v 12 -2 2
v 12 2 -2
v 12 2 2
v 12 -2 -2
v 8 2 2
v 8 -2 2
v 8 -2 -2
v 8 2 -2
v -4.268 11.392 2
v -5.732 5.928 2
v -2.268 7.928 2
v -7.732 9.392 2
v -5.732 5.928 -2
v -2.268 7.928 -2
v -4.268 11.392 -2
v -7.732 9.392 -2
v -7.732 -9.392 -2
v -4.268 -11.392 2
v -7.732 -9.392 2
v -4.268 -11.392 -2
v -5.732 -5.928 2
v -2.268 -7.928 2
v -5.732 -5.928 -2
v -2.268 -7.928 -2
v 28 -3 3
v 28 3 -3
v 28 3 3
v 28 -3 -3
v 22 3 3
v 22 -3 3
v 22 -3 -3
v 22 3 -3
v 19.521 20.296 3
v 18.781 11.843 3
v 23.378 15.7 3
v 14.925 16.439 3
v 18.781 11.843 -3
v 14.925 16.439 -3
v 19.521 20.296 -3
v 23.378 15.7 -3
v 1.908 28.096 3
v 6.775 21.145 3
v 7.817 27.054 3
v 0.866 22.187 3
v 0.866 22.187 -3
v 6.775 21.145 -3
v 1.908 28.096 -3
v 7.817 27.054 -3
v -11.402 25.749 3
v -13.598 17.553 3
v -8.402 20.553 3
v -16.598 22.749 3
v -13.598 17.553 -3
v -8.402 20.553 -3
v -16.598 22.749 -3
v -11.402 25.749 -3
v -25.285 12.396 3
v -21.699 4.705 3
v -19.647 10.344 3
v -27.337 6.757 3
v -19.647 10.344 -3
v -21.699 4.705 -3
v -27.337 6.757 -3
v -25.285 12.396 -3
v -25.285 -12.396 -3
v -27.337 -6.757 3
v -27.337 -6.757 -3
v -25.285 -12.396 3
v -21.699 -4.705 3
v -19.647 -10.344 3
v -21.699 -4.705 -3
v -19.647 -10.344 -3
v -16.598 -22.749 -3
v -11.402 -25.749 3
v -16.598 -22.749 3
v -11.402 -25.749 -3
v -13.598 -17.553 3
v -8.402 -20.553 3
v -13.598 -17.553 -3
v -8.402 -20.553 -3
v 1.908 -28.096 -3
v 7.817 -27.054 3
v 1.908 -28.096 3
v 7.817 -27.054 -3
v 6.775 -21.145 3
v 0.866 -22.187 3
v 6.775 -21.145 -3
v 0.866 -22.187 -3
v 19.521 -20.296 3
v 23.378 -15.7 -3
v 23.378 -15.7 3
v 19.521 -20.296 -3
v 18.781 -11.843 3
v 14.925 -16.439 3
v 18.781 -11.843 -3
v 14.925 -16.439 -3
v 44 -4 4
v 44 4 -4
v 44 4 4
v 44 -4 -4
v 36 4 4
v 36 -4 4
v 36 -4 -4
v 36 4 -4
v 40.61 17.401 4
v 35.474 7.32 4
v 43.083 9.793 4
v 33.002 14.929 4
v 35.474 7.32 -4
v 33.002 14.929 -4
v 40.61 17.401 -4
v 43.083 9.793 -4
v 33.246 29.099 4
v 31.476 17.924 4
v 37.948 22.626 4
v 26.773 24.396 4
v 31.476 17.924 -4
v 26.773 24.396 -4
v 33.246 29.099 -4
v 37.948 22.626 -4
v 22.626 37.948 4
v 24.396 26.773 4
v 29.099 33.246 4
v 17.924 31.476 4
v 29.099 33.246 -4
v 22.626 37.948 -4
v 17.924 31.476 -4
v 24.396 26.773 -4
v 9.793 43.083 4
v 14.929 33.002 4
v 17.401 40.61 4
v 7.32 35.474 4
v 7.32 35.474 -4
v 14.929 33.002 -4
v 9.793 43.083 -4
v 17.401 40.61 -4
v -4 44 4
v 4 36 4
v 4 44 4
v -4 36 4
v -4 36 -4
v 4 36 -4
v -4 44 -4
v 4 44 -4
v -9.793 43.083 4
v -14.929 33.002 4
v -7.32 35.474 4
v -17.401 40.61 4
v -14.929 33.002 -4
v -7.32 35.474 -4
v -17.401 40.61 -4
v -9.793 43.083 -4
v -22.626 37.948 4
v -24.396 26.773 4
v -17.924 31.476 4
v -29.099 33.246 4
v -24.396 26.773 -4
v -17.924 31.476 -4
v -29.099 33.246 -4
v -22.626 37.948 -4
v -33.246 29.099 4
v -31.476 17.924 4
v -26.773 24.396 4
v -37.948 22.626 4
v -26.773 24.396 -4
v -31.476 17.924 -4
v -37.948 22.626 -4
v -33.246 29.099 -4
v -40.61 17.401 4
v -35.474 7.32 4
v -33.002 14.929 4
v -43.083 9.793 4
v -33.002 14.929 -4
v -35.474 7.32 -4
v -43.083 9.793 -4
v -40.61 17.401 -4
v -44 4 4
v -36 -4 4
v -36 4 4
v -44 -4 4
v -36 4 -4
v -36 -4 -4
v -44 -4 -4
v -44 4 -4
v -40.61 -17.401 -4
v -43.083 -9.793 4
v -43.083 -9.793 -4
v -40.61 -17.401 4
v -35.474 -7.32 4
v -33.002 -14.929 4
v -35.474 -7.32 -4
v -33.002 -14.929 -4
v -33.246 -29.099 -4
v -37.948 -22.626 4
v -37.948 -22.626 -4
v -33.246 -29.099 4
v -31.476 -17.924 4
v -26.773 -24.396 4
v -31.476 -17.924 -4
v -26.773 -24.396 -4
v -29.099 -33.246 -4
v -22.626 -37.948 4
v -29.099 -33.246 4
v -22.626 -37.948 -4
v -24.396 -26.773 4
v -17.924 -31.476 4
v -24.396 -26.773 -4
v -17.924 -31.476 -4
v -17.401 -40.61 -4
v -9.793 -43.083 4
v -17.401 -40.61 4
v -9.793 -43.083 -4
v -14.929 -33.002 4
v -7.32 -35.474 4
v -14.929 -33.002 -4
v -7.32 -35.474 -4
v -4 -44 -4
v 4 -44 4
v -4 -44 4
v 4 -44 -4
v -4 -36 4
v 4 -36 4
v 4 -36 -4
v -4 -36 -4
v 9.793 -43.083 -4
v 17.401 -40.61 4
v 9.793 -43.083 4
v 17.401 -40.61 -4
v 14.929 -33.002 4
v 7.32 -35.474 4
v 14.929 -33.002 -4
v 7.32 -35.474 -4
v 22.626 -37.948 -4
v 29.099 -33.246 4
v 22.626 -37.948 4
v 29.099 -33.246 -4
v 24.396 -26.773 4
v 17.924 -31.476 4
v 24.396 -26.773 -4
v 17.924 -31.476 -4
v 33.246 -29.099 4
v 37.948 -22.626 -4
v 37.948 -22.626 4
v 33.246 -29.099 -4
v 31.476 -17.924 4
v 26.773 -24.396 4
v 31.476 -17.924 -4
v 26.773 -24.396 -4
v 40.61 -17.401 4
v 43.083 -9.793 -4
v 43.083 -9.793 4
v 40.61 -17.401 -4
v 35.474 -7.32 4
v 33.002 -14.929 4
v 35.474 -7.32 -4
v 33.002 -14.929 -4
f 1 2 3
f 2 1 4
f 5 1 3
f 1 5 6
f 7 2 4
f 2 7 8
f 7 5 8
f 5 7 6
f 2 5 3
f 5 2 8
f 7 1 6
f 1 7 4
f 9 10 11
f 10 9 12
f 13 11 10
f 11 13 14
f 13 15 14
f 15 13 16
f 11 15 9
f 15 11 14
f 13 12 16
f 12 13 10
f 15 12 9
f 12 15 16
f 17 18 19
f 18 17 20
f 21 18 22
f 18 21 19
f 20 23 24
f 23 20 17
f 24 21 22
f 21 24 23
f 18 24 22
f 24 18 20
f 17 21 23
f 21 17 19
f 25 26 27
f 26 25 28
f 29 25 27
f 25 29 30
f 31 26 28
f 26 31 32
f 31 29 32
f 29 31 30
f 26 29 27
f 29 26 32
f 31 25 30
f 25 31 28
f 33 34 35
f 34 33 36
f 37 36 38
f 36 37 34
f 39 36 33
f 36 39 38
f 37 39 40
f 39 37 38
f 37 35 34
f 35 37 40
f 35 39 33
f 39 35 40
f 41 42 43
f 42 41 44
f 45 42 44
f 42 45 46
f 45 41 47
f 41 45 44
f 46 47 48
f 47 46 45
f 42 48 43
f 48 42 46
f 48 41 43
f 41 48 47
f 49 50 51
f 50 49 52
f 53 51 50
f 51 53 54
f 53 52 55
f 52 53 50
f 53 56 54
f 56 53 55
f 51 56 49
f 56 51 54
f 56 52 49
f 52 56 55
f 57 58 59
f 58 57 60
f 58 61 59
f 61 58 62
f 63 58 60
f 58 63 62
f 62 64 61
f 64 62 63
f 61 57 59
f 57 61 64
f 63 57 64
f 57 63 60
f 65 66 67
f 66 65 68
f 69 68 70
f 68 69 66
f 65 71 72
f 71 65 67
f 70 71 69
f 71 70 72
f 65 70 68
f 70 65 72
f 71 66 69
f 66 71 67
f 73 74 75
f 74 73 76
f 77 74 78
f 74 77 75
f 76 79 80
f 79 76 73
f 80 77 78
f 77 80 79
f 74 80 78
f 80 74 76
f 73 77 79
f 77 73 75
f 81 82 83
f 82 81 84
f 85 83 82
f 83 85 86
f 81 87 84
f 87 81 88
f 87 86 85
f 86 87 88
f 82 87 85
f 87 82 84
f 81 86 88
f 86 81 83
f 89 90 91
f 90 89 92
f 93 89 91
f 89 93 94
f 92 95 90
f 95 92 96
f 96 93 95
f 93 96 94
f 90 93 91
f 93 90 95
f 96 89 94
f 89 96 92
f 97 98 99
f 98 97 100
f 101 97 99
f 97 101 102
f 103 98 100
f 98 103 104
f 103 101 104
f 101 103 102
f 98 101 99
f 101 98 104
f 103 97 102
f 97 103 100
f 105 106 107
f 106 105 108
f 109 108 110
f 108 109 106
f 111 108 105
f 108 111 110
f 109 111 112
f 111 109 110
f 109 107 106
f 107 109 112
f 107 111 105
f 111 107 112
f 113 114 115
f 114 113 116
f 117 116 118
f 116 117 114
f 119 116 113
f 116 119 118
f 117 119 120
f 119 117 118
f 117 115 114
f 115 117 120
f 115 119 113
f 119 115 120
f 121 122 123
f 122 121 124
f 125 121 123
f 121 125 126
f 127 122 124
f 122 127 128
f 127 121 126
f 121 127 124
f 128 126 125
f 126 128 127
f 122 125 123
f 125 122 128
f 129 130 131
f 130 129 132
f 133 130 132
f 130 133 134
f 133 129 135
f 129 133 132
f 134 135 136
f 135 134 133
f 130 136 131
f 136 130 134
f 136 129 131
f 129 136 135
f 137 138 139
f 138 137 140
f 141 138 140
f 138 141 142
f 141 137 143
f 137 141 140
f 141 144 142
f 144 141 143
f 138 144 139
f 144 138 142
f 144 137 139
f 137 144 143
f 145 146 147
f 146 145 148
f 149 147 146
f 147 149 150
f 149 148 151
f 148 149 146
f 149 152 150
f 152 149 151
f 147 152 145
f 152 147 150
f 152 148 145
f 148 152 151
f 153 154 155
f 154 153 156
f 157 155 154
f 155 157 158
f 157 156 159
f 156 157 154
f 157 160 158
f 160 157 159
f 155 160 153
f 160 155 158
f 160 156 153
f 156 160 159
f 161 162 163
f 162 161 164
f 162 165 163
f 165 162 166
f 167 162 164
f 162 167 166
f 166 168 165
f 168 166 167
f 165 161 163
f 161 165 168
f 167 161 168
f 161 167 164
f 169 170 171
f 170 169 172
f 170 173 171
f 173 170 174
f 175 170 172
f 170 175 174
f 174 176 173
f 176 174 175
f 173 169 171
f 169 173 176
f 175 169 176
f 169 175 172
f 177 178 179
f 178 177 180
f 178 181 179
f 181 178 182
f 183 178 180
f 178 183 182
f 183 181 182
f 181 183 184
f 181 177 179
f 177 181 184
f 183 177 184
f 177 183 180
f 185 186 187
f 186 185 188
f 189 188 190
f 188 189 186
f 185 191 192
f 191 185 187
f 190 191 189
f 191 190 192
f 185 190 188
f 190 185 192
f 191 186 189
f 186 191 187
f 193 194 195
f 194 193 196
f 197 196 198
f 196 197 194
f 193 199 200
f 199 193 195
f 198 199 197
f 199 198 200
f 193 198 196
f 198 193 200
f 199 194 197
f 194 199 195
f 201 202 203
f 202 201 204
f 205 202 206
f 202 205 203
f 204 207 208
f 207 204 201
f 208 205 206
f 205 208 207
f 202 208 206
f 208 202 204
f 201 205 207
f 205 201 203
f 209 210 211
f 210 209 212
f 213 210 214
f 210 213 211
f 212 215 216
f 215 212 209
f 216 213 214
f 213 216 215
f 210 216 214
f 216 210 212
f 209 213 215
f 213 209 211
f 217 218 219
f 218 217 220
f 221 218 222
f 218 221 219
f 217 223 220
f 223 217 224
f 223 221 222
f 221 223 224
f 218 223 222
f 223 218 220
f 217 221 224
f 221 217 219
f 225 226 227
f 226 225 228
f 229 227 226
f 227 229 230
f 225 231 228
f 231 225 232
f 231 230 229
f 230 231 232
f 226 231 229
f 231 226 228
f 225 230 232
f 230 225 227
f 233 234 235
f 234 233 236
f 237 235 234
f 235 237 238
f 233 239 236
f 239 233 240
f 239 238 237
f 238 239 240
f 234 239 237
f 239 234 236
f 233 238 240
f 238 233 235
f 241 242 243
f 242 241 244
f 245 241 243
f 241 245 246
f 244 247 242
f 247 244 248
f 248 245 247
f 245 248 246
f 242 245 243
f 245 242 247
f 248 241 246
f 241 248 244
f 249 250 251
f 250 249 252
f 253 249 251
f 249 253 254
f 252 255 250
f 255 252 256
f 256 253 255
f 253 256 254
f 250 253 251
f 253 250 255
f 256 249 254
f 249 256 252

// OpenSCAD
echo(version=version());

function size(x) = assert(x % 2 == 0, "Size must be an even number") x;

module ring(r = 10, cnt = 3, s = 6) {
    assert(r >= 10, "Parameter r must be >= 10");
    assert(cnt >= 3 && cnt <= 20, "Parameter cnt must be between 3 and 20 (inclusive");
    for (a = [0 : cnt - 1]) {
        rotate(a * 360 / cnt) translate([r, 0, 0]) cube(size(s), center = true);
    }
}

// ring(5, 5, 4); // trigger assertion for parameter r

// ring(10, 2, 4); // trigger assertion for parameter cnt

// ring(10, 3, 5); // trigger assertion in function size()

color("red") ring(10, 3, 4);
color("green") ring(25, 9, 6);
color("blue") ring(40, 20, 8);

// Written in 2018 by Torsten Paul <Torsten.Paul@gmx.de>
//
// To the extent possible under law, the author(s) have dedicated all
// copyright and related and neighboring rights to this software to the
// public domain worldwide. This software is distributed without any
// warranty.
//
// You should have received a copy of the CC0 Public Domain
// Dedication along with this software.
// If not, see <http://creativecommons.org/publicdomain/zero/1.0/>.
